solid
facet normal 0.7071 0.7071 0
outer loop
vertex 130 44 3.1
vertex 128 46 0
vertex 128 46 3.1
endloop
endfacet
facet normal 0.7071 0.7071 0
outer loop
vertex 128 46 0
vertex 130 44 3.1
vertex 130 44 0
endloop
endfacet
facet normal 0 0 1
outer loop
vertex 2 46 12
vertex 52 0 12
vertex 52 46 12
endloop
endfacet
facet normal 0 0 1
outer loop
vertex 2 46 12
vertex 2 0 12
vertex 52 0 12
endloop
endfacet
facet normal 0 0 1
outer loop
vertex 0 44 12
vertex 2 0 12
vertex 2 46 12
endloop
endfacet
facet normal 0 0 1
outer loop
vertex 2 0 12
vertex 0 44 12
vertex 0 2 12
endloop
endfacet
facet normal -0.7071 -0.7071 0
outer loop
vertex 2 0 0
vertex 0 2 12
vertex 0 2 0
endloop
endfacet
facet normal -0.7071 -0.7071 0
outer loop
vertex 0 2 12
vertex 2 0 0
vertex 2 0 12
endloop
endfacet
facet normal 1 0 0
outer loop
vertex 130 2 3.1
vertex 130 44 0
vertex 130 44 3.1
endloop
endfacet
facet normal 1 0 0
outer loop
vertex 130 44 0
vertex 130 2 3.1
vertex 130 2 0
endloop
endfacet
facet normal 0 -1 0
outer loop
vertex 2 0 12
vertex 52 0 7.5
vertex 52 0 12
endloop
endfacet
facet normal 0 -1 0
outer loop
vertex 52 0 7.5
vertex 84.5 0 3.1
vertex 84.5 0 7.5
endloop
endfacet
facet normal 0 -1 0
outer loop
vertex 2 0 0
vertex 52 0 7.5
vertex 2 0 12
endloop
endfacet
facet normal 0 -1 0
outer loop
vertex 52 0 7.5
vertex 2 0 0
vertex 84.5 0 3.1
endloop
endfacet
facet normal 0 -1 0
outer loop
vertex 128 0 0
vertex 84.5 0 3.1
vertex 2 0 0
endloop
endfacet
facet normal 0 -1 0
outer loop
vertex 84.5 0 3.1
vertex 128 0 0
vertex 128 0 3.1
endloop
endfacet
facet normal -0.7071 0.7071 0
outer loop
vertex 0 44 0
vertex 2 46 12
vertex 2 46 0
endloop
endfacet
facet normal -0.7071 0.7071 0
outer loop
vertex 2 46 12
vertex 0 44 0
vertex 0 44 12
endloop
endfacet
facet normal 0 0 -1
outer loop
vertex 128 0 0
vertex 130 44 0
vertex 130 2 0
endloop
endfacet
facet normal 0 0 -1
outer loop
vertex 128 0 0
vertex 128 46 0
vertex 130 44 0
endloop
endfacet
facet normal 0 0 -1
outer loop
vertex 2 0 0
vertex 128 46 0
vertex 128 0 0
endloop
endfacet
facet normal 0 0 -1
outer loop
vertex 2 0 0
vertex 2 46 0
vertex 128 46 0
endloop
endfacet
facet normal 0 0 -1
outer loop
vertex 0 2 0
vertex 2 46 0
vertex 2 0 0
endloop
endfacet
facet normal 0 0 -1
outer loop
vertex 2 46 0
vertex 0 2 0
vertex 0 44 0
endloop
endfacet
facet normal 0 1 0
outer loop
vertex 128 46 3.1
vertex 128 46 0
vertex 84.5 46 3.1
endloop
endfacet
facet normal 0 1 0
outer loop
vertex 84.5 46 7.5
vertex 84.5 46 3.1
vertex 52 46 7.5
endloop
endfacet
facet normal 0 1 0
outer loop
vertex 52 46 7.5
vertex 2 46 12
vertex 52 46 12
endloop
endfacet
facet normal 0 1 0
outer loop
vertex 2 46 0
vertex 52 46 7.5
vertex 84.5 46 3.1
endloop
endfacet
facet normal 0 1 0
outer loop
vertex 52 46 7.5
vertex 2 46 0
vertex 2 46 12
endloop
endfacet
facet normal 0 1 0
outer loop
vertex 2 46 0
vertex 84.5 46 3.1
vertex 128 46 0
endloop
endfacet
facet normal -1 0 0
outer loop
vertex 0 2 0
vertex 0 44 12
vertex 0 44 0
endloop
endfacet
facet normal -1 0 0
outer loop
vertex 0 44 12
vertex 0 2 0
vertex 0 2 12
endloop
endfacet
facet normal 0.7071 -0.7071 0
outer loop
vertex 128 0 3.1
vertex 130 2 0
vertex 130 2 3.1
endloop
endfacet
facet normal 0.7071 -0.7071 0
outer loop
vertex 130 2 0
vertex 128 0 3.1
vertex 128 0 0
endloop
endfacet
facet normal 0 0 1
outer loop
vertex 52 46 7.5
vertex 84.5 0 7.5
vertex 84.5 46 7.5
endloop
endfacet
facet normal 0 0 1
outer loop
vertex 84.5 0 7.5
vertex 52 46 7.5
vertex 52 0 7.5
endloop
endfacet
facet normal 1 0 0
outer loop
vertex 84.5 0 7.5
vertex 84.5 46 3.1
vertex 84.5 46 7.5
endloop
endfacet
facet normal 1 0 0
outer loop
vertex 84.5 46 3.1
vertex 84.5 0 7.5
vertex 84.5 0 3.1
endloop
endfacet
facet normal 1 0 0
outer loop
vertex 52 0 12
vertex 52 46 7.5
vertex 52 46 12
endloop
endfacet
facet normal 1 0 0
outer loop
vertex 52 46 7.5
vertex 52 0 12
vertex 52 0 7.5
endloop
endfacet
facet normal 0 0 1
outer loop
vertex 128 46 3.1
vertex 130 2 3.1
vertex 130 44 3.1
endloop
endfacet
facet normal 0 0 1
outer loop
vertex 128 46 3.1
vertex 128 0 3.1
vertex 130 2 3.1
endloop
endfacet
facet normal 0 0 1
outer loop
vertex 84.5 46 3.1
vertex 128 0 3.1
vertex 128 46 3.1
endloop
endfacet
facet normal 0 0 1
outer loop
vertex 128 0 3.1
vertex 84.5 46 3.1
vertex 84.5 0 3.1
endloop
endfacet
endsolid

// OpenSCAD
$fn = 32;

// ----------------------------------------------------------------------
// Stepped bar: twostep, 130 x 46 x 12/3.1 mm
// ----------------------------------------------------------------------

// --- parameters (mm) ---
bar_l = 130;              // bar length, X
bar_w = 46;               // bar width, Y
plate_t = 12;             // thickness of the thick zone, Z
thin_t = 3.1;             // thickness of the thin zone
corner_c = 2;             // corner chamfer of the bar
step_cut = 8.9;           // material removed from the thin zone
stair1_x = 52;            // position of the first stair
stair2_x = 84.5;          // position of the second stair
mid_t = 7.5;              // thickness of the middle zone
depth_1 = 4.5;            // depth of cut 1 from the top face
depth_2 = 8.9;            // depth of cut 2 from the top face

profile = [[2, 0], [128, 0], [130, 2], [130, 44], [128, 46], [2, 46], [0, 44], [0, 2]];  // primary outline, 8 points, counter clockwise
void_1 = [[52, -1], [84.5, -1], [84.5, 47], [52, 47]];  // first stair, 4 points
void_2 = [[84.5, -1], [131, -1], [131, 47], [84.5, 47]];  // second stair, 4 points

// --- the one profile operation ---
difference() {
  linear_extrude(height = plate_t) polygon(points = profile);
  translate([0, 0, plate_t - depth_1])
    linear_extrude(height = depth_1 + 1) polygon(points = void_1);
  translate([0, 0, plate_t - depth_2])
    linear_extrude(height = depth_2 + 1) polygon(points = void_2);
}
